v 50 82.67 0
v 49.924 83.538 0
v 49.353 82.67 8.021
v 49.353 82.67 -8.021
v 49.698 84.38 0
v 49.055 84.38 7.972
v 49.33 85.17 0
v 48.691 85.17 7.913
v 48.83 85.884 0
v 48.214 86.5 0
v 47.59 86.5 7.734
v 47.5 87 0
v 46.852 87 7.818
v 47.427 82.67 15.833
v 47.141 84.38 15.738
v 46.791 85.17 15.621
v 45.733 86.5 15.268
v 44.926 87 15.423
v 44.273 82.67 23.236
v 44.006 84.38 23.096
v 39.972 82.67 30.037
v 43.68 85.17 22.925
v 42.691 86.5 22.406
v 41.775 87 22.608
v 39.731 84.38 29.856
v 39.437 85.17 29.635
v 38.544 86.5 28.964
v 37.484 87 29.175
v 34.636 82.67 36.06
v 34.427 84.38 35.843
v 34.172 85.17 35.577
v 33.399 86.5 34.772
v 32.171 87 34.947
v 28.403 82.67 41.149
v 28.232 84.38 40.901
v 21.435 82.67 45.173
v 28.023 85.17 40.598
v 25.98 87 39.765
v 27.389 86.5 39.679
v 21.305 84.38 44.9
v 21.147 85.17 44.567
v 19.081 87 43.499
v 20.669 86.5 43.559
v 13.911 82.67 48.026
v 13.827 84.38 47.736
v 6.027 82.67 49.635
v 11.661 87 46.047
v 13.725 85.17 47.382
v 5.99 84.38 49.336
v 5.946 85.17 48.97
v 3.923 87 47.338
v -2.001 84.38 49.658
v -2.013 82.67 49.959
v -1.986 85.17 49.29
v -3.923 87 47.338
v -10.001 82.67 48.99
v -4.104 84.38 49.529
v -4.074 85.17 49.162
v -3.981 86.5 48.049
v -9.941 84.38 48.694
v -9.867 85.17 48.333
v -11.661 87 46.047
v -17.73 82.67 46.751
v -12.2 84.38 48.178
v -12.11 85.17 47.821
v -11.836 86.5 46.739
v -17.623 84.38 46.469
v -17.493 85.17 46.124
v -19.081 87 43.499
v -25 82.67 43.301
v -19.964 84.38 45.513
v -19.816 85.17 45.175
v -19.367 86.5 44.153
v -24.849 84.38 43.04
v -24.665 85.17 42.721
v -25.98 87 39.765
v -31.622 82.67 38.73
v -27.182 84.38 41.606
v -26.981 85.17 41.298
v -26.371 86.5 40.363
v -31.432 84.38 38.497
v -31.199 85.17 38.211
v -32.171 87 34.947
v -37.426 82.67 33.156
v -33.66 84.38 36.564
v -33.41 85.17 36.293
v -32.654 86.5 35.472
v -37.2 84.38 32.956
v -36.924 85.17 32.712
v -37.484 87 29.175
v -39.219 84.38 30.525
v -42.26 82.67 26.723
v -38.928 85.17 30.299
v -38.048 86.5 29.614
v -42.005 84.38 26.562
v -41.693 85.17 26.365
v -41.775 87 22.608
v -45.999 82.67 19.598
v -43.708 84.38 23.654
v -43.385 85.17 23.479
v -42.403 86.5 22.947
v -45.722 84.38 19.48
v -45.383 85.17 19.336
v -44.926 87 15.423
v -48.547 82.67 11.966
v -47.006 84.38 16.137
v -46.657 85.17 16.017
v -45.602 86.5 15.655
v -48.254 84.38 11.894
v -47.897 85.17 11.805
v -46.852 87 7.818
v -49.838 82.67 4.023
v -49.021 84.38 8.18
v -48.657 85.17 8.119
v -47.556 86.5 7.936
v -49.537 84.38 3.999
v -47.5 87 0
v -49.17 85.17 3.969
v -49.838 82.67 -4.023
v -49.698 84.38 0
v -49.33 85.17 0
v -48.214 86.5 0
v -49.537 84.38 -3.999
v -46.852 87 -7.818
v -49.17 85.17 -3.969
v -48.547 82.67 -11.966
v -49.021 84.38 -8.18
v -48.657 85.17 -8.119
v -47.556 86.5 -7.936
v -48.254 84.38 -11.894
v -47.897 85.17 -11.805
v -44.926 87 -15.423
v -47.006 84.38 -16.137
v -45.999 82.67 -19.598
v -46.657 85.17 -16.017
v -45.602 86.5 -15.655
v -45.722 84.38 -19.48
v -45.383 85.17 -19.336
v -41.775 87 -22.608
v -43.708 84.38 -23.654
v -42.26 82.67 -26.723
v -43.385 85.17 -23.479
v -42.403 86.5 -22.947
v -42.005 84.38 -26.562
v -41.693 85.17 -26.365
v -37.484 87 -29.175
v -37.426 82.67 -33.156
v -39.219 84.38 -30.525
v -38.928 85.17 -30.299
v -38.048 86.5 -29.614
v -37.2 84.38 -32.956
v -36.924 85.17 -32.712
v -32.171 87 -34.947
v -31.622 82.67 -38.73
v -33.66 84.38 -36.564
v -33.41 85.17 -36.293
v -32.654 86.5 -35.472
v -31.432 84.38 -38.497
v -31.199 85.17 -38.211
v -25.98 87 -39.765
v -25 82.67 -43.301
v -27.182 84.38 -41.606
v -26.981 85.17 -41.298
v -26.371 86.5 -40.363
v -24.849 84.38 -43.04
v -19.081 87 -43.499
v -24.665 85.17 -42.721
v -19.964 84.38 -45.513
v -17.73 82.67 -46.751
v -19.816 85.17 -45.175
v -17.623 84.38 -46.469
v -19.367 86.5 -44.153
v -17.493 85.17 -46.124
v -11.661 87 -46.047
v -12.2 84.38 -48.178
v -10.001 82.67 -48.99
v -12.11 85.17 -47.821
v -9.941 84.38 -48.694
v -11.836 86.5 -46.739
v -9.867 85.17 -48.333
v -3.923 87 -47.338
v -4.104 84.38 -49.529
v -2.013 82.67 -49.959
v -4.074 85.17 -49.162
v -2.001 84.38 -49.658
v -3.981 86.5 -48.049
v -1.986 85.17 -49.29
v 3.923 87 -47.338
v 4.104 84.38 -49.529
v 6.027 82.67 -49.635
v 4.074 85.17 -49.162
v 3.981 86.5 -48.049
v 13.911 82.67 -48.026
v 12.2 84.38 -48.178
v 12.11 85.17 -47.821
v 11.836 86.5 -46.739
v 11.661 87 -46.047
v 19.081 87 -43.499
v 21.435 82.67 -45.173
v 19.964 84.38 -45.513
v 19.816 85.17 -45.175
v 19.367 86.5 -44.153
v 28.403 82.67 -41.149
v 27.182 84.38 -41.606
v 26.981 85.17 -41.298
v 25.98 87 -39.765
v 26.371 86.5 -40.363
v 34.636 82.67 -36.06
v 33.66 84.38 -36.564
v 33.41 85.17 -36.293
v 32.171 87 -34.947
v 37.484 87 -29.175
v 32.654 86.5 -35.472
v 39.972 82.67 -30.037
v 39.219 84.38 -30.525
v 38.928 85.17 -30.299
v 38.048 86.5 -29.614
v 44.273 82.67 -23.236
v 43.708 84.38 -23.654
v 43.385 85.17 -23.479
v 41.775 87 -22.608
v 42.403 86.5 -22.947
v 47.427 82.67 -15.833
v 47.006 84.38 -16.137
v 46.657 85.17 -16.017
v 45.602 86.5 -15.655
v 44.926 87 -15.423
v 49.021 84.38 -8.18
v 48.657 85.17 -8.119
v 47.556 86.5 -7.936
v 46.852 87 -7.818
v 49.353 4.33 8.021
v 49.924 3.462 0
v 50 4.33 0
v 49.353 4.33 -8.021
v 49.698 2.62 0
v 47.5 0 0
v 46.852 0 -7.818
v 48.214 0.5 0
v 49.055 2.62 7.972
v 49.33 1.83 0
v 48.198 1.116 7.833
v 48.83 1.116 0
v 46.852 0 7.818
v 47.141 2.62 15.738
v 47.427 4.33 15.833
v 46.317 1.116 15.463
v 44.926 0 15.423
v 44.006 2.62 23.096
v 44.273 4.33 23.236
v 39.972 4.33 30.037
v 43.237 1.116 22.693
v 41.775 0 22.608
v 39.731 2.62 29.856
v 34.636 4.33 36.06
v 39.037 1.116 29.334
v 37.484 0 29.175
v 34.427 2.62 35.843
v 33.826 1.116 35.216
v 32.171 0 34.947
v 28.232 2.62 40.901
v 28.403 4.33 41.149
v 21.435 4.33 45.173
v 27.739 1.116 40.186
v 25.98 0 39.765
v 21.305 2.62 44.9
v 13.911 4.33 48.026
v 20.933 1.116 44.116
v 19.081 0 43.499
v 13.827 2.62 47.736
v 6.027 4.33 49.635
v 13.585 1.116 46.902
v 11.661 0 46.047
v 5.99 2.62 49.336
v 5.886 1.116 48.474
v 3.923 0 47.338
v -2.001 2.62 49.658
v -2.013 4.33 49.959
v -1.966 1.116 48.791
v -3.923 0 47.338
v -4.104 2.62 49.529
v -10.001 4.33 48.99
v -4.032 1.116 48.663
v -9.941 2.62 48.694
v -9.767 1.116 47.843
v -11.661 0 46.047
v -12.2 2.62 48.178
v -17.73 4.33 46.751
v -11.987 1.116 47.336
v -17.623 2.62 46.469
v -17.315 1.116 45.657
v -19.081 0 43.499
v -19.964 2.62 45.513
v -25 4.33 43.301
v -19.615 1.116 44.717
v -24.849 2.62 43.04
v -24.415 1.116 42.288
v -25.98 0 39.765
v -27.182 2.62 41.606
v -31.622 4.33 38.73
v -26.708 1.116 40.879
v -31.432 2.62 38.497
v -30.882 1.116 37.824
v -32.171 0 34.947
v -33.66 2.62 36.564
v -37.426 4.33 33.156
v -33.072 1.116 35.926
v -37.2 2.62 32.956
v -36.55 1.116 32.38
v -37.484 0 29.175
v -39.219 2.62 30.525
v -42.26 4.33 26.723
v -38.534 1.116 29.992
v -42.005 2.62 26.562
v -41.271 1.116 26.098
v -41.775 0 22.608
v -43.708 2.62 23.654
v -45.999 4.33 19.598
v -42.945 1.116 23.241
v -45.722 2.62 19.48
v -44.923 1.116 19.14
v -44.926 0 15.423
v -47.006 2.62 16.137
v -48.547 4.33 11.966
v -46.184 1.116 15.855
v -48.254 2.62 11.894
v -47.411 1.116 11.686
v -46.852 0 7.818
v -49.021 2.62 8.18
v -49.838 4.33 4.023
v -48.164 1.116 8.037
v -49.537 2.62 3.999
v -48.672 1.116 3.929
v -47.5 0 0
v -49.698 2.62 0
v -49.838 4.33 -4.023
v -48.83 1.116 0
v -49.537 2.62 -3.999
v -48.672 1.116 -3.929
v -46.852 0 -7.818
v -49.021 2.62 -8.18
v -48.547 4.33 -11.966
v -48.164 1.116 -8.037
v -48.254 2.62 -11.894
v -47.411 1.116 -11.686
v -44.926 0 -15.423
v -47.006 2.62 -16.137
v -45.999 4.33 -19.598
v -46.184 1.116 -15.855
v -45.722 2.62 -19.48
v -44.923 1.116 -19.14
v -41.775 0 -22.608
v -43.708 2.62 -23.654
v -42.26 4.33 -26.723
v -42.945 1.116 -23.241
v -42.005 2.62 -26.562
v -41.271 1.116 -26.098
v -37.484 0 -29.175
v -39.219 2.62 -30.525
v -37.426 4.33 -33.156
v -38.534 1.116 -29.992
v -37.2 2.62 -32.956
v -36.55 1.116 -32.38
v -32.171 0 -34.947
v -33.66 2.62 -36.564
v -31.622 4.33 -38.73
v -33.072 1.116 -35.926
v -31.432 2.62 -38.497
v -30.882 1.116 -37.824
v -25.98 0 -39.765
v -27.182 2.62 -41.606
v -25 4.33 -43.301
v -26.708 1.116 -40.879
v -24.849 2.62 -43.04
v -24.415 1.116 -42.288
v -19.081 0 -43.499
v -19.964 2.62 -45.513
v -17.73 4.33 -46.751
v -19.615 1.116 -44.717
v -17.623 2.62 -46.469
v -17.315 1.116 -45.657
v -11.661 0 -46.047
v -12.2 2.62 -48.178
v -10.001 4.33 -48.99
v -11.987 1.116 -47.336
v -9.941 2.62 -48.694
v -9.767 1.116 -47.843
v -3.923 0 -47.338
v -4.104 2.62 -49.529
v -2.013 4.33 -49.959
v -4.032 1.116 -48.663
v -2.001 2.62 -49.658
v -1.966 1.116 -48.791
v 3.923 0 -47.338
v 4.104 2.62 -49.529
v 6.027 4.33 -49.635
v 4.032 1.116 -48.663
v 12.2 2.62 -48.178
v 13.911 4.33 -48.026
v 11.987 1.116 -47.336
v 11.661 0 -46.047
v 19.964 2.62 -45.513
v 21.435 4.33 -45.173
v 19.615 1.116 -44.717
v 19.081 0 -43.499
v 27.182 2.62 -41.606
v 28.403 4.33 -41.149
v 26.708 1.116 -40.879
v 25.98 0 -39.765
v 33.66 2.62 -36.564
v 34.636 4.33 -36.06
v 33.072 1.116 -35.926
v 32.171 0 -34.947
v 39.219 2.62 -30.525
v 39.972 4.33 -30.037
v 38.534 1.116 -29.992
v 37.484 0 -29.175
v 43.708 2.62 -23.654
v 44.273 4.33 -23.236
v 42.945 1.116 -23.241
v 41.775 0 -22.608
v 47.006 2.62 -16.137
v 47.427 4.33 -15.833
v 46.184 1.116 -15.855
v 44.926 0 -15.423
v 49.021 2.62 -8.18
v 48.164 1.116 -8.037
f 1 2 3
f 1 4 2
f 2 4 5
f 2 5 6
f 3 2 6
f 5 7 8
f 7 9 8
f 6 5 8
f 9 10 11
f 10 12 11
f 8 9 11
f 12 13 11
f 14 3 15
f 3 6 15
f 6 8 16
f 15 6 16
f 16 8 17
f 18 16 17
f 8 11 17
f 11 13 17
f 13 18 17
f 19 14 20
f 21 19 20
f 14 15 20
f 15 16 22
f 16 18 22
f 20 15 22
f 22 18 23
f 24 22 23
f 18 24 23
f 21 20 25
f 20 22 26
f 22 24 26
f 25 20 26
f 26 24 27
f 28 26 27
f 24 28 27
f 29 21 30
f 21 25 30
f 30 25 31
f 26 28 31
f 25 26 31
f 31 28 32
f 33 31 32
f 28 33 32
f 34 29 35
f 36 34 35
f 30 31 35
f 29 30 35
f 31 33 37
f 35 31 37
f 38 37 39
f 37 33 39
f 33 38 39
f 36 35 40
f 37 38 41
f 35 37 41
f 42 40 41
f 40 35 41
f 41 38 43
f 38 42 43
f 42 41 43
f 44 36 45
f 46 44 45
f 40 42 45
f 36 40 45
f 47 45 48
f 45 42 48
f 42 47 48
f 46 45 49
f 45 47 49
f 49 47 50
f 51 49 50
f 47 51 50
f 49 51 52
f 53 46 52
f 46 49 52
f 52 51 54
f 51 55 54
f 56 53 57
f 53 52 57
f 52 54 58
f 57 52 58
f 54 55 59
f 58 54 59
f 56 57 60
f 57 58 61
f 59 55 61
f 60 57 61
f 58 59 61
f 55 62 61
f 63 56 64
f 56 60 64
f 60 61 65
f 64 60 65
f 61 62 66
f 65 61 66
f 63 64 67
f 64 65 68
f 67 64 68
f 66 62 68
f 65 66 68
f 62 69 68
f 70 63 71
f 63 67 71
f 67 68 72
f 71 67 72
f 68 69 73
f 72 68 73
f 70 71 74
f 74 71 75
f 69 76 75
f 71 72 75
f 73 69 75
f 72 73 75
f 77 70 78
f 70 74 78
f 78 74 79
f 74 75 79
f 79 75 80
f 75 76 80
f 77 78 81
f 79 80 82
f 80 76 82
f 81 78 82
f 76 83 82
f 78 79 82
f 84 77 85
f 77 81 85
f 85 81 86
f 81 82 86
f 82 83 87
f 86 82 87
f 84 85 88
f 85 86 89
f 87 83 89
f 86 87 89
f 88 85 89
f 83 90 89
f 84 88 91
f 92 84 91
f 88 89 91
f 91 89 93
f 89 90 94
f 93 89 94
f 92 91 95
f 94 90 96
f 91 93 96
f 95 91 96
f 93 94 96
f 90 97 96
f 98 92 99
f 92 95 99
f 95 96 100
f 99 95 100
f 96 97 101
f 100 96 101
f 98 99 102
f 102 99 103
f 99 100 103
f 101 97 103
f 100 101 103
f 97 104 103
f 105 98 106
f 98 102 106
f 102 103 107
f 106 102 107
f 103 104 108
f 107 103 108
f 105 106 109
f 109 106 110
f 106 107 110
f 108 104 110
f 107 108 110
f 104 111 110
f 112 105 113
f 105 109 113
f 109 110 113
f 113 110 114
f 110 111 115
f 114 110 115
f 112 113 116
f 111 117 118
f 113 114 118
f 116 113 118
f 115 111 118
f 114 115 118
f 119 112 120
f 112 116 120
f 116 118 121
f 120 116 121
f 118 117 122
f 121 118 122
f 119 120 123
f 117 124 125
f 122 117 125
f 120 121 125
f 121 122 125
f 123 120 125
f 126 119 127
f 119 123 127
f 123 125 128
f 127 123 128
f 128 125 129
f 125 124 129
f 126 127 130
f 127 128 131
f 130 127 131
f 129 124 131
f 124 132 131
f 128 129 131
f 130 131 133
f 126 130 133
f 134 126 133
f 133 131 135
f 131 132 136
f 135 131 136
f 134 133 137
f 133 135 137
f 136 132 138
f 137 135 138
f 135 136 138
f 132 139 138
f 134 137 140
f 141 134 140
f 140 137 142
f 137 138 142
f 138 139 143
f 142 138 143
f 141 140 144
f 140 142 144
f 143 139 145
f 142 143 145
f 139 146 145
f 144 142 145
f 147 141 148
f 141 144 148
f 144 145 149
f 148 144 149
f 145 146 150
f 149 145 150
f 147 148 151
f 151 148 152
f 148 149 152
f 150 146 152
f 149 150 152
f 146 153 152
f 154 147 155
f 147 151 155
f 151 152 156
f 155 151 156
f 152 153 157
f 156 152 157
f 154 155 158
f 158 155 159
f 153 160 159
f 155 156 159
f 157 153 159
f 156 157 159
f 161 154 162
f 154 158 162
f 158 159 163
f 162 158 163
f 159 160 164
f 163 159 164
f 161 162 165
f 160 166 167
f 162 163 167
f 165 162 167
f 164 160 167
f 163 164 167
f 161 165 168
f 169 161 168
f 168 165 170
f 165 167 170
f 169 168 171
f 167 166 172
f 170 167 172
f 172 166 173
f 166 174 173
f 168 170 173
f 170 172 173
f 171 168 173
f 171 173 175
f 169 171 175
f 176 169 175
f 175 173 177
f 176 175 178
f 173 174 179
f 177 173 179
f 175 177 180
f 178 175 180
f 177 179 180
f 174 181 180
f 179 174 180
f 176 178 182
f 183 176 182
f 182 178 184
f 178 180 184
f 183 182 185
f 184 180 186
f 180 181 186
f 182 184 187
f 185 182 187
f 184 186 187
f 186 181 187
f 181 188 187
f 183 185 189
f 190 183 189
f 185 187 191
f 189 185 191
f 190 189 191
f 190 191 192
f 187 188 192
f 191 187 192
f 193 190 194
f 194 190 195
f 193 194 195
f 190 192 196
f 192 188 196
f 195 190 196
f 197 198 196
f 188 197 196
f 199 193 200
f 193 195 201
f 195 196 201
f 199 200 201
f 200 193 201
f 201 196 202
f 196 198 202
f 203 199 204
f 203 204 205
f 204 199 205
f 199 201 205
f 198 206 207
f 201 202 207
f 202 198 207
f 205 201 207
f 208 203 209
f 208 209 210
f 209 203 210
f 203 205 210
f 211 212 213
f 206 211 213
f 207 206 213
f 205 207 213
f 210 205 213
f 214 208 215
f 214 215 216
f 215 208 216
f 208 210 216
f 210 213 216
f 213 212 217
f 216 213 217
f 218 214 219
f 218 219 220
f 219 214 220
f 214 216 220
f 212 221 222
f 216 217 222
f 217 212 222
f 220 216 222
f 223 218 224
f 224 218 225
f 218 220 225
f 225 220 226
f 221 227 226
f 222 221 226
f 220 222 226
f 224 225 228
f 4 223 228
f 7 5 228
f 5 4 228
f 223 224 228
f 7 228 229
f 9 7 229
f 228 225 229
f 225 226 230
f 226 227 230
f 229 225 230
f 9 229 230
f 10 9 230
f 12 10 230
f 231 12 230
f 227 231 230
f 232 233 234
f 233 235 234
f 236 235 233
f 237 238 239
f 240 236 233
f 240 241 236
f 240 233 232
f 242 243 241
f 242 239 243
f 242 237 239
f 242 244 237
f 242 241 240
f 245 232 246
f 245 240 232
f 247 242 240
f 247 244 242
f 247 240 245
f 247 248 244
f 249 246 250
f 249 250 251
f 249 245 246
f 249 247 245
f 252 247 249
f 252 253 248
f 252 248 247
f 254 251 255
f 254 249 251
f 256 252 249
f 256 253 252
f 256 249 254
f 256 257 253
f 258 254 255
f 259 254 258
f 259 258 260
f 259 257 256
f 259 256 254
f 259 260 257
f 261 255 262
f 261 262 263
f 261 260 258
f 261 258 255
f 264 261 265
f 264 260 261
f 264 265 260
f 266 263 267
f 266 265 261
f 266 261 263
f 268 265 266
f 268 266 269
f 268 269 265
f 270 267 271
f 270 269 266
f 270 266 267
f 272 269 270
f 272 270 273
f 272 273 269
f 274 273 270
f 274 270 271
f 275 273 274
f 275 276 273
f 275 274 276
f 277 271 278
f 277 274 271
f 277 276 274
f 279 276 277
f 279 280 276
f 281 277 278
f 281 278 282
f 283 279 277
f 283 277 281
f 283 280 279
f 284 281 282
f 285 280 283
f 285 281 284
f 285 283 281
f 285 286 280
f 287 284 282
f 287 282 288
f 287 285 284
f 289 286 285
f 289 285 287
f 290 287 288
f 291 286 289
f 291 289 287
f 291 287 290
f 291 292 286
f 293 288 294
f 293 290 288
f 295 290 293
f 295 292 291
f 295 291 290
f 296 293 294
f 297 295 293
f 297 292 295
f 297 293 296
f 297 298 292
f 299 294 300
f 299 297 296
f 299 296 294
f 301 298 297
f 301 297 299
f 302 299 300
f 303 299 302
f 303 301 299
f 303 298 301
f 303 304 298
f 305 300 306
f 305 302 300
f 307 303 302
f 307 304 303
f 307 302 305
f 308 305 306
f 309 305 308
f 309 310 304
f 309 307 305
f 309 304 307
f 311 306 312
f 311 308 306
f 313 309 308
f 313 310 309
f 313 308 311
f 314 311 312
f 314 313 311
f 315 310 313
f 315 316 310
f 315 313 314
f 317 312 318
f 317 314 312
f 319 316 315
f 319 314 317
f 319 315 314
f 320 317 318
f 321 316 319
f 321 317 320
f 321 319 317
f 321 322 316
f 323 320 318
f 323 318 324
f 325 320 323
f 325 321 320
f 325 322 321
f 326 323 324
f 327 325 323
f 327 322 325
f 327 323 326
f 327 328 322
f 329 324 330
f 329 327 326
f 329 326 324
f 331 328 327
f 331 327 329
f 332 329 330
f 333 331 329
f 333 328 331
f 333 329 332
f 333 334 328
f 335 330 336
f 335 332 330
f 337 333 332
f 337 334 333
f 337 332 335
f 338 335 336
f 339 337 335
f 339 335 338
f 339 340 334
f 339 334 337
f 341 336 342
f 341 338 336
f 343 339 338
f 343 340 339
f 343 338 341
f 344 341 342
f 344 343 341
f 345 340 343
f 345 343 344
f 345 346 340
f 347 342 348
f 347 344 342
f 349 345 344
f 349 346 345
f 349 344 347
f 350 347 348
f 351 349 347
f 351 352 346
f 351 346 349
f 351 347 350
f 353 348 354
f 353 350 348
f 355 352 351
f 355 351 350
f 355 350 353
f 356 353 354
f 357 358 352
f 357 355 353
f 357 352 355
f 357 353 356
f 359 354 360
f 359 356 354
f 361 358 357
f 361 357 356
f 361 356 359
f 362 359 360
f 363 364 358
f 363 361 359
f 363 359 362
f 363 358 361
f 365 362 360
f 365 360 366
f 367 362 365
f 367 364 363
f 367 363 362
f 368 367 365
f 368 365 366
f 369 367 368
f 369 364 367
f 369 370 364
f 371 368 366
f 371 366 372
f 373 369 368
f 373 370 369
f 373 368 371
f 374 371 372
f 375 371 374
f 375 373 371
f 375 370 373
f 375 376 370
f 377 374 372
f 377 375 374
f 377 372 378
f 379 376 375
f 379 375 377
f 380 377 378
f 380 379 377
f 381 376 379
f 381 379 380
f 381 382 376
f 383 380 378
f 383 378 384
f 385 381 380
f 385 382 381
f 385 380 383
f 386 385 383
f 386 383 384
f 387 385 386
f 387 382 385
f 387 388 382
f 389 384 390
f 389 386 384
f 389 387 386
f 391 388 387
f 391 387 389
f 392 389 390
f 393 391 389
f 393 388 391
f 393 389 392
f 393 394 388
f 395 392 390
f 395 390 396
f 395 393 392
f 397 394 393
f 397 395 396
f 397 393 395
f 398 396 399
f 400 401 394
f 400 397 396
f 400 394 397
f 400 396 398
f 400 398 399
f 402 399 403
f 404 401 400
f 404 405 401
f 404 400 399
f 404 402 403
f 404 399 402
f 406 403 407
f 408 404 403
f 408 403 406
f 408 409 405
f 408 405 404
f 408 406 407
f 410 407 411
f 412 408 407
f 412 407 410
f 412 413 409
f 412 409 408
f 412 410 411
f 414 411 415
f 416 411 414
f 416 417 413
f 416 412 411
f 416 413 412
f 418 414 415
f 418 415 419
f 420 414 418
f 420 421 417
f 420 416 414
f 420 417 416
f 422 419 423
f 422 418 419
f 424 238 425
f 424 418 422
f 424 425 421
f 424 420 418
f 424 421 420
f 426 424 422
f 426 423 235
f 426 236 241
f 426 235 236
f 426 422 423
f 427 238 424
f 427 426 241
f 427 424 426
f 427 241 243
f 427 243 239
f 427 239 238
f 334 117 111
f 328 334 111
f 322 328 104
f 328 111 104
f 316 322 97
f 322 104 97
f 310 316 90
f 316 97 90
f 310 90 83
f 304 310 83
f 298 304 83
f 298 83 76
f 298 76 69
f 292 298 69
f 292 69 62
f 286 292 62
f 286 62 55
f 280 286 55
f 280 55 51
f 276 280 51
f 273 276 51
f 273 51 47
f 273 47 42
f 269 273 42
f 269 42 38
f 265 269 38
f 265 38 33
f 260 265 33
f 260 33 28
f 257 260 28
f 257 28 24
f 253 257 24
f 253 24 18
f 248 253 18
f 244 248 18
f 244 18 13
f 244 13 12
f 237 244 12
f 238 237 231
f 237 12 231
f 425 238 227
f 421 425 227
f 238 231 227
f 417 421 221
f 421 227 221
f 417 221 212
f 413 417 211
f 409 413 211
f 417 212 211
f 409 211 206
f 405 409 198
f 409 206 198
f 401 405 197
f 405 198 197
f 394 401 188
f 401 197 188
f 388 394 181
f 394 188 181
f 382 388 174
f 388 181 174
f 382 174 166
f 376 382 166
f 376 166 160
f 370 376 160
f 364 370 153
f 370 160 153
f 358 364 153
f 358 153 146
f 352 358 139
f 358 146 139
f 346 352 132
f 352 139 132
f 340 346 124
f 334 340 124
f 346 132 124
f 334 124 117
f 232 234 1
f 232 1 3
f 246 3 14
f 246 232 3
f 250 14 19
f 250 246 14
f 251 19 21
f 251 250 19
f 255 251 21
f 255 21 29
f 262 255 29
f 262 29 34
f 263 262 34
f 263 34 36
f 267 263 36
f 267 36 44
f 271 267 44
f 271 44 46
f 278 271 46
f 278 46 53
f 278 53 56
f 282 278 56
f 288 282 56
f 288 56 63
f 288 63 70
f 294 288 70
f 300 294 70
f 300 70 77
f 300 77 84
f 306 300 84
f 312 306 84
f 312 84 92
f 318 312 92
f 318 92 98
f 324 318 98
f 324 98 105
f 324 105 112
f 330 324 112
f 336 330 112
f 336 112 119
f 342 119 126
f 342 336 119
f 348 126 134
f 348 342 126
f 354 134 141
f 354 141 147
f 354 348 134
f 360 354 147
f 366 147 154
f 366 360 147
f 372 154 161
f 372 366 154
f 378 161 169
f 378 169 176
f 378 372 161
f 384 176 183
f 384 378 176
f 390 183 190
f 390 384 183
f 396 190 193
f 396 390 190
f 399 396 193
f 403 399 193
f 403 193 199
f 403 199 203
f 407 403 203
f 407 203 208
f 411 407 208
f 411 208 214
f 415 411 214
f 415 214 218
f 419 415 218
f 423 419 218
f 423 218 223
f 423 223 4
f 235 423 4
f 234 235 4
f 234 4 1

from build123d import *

# Parameters (mm, degrees)
F0_R     = 50
F1_DEPTH = 87
F3_D     = 95
F3_DEPTH = 100
F3_TIP   = 28.5408794038


# Not quite as in the source:
# - a fillet or chamfer that OpenCascade refuses, or shapes differently, is made with other operations: its cross-section is extruded or revolved along the edge and cut away or added


with BuildPart() as f1:
    # F0 (on Front) → F1 (new body)
    with BuildSketch(Plane.XZ):
        Circle(F0_R)
    extrude(amount=-F1_DEPTH)

    # F3
    with Locations(Plane.XZ):
        with Locations((0, 0)):
            Hole(F3_D / 2, depth=F3_DEPTH)
            with Locations((0, 0, -(F3_DEPTH + F3_TIP / 2))):  # 118° drill point
                Cone(0, F3_D / 2, F3_TIP, mode=Mode.SUBTRACT)

    # F4: fillet of radius 5 on 2 edges, made by hand

    # F4_s1 → F4_t2 (revolve, cut)
    with BuildSketch(Plane.XY):
        with BuildLine():
            ThreePointArc((50, 4.3301270189), (49.3301270189, 1.8301270189), (47.5, 0))
            Line((47.5, 0), (50, 0))
            Line((50, 0), (50, 4.3301270189))
        make_face()
    revolve(axis=Axis((0, 0, 0), (0, -1, 0)), mode=Mode.SUBTRACT)

    # F4_s3 → F4_t4 (revolve, cut)
    with BuildSketch(Plane.XY):
        with BuildLine():
            ThreePointArc((50, 82.6698729811), (49.3301270189, 85.1698729811), (47.5, 87))
            Line((47.5, 87), (50, 87))
            Line((50, 87), (50, 82.6698729811))
        make_face()
    revolve(axis=Axis((0, 87, 0), (0, -1, 0)), mode=Mode.SUBTRACT)


solid = f1.part
